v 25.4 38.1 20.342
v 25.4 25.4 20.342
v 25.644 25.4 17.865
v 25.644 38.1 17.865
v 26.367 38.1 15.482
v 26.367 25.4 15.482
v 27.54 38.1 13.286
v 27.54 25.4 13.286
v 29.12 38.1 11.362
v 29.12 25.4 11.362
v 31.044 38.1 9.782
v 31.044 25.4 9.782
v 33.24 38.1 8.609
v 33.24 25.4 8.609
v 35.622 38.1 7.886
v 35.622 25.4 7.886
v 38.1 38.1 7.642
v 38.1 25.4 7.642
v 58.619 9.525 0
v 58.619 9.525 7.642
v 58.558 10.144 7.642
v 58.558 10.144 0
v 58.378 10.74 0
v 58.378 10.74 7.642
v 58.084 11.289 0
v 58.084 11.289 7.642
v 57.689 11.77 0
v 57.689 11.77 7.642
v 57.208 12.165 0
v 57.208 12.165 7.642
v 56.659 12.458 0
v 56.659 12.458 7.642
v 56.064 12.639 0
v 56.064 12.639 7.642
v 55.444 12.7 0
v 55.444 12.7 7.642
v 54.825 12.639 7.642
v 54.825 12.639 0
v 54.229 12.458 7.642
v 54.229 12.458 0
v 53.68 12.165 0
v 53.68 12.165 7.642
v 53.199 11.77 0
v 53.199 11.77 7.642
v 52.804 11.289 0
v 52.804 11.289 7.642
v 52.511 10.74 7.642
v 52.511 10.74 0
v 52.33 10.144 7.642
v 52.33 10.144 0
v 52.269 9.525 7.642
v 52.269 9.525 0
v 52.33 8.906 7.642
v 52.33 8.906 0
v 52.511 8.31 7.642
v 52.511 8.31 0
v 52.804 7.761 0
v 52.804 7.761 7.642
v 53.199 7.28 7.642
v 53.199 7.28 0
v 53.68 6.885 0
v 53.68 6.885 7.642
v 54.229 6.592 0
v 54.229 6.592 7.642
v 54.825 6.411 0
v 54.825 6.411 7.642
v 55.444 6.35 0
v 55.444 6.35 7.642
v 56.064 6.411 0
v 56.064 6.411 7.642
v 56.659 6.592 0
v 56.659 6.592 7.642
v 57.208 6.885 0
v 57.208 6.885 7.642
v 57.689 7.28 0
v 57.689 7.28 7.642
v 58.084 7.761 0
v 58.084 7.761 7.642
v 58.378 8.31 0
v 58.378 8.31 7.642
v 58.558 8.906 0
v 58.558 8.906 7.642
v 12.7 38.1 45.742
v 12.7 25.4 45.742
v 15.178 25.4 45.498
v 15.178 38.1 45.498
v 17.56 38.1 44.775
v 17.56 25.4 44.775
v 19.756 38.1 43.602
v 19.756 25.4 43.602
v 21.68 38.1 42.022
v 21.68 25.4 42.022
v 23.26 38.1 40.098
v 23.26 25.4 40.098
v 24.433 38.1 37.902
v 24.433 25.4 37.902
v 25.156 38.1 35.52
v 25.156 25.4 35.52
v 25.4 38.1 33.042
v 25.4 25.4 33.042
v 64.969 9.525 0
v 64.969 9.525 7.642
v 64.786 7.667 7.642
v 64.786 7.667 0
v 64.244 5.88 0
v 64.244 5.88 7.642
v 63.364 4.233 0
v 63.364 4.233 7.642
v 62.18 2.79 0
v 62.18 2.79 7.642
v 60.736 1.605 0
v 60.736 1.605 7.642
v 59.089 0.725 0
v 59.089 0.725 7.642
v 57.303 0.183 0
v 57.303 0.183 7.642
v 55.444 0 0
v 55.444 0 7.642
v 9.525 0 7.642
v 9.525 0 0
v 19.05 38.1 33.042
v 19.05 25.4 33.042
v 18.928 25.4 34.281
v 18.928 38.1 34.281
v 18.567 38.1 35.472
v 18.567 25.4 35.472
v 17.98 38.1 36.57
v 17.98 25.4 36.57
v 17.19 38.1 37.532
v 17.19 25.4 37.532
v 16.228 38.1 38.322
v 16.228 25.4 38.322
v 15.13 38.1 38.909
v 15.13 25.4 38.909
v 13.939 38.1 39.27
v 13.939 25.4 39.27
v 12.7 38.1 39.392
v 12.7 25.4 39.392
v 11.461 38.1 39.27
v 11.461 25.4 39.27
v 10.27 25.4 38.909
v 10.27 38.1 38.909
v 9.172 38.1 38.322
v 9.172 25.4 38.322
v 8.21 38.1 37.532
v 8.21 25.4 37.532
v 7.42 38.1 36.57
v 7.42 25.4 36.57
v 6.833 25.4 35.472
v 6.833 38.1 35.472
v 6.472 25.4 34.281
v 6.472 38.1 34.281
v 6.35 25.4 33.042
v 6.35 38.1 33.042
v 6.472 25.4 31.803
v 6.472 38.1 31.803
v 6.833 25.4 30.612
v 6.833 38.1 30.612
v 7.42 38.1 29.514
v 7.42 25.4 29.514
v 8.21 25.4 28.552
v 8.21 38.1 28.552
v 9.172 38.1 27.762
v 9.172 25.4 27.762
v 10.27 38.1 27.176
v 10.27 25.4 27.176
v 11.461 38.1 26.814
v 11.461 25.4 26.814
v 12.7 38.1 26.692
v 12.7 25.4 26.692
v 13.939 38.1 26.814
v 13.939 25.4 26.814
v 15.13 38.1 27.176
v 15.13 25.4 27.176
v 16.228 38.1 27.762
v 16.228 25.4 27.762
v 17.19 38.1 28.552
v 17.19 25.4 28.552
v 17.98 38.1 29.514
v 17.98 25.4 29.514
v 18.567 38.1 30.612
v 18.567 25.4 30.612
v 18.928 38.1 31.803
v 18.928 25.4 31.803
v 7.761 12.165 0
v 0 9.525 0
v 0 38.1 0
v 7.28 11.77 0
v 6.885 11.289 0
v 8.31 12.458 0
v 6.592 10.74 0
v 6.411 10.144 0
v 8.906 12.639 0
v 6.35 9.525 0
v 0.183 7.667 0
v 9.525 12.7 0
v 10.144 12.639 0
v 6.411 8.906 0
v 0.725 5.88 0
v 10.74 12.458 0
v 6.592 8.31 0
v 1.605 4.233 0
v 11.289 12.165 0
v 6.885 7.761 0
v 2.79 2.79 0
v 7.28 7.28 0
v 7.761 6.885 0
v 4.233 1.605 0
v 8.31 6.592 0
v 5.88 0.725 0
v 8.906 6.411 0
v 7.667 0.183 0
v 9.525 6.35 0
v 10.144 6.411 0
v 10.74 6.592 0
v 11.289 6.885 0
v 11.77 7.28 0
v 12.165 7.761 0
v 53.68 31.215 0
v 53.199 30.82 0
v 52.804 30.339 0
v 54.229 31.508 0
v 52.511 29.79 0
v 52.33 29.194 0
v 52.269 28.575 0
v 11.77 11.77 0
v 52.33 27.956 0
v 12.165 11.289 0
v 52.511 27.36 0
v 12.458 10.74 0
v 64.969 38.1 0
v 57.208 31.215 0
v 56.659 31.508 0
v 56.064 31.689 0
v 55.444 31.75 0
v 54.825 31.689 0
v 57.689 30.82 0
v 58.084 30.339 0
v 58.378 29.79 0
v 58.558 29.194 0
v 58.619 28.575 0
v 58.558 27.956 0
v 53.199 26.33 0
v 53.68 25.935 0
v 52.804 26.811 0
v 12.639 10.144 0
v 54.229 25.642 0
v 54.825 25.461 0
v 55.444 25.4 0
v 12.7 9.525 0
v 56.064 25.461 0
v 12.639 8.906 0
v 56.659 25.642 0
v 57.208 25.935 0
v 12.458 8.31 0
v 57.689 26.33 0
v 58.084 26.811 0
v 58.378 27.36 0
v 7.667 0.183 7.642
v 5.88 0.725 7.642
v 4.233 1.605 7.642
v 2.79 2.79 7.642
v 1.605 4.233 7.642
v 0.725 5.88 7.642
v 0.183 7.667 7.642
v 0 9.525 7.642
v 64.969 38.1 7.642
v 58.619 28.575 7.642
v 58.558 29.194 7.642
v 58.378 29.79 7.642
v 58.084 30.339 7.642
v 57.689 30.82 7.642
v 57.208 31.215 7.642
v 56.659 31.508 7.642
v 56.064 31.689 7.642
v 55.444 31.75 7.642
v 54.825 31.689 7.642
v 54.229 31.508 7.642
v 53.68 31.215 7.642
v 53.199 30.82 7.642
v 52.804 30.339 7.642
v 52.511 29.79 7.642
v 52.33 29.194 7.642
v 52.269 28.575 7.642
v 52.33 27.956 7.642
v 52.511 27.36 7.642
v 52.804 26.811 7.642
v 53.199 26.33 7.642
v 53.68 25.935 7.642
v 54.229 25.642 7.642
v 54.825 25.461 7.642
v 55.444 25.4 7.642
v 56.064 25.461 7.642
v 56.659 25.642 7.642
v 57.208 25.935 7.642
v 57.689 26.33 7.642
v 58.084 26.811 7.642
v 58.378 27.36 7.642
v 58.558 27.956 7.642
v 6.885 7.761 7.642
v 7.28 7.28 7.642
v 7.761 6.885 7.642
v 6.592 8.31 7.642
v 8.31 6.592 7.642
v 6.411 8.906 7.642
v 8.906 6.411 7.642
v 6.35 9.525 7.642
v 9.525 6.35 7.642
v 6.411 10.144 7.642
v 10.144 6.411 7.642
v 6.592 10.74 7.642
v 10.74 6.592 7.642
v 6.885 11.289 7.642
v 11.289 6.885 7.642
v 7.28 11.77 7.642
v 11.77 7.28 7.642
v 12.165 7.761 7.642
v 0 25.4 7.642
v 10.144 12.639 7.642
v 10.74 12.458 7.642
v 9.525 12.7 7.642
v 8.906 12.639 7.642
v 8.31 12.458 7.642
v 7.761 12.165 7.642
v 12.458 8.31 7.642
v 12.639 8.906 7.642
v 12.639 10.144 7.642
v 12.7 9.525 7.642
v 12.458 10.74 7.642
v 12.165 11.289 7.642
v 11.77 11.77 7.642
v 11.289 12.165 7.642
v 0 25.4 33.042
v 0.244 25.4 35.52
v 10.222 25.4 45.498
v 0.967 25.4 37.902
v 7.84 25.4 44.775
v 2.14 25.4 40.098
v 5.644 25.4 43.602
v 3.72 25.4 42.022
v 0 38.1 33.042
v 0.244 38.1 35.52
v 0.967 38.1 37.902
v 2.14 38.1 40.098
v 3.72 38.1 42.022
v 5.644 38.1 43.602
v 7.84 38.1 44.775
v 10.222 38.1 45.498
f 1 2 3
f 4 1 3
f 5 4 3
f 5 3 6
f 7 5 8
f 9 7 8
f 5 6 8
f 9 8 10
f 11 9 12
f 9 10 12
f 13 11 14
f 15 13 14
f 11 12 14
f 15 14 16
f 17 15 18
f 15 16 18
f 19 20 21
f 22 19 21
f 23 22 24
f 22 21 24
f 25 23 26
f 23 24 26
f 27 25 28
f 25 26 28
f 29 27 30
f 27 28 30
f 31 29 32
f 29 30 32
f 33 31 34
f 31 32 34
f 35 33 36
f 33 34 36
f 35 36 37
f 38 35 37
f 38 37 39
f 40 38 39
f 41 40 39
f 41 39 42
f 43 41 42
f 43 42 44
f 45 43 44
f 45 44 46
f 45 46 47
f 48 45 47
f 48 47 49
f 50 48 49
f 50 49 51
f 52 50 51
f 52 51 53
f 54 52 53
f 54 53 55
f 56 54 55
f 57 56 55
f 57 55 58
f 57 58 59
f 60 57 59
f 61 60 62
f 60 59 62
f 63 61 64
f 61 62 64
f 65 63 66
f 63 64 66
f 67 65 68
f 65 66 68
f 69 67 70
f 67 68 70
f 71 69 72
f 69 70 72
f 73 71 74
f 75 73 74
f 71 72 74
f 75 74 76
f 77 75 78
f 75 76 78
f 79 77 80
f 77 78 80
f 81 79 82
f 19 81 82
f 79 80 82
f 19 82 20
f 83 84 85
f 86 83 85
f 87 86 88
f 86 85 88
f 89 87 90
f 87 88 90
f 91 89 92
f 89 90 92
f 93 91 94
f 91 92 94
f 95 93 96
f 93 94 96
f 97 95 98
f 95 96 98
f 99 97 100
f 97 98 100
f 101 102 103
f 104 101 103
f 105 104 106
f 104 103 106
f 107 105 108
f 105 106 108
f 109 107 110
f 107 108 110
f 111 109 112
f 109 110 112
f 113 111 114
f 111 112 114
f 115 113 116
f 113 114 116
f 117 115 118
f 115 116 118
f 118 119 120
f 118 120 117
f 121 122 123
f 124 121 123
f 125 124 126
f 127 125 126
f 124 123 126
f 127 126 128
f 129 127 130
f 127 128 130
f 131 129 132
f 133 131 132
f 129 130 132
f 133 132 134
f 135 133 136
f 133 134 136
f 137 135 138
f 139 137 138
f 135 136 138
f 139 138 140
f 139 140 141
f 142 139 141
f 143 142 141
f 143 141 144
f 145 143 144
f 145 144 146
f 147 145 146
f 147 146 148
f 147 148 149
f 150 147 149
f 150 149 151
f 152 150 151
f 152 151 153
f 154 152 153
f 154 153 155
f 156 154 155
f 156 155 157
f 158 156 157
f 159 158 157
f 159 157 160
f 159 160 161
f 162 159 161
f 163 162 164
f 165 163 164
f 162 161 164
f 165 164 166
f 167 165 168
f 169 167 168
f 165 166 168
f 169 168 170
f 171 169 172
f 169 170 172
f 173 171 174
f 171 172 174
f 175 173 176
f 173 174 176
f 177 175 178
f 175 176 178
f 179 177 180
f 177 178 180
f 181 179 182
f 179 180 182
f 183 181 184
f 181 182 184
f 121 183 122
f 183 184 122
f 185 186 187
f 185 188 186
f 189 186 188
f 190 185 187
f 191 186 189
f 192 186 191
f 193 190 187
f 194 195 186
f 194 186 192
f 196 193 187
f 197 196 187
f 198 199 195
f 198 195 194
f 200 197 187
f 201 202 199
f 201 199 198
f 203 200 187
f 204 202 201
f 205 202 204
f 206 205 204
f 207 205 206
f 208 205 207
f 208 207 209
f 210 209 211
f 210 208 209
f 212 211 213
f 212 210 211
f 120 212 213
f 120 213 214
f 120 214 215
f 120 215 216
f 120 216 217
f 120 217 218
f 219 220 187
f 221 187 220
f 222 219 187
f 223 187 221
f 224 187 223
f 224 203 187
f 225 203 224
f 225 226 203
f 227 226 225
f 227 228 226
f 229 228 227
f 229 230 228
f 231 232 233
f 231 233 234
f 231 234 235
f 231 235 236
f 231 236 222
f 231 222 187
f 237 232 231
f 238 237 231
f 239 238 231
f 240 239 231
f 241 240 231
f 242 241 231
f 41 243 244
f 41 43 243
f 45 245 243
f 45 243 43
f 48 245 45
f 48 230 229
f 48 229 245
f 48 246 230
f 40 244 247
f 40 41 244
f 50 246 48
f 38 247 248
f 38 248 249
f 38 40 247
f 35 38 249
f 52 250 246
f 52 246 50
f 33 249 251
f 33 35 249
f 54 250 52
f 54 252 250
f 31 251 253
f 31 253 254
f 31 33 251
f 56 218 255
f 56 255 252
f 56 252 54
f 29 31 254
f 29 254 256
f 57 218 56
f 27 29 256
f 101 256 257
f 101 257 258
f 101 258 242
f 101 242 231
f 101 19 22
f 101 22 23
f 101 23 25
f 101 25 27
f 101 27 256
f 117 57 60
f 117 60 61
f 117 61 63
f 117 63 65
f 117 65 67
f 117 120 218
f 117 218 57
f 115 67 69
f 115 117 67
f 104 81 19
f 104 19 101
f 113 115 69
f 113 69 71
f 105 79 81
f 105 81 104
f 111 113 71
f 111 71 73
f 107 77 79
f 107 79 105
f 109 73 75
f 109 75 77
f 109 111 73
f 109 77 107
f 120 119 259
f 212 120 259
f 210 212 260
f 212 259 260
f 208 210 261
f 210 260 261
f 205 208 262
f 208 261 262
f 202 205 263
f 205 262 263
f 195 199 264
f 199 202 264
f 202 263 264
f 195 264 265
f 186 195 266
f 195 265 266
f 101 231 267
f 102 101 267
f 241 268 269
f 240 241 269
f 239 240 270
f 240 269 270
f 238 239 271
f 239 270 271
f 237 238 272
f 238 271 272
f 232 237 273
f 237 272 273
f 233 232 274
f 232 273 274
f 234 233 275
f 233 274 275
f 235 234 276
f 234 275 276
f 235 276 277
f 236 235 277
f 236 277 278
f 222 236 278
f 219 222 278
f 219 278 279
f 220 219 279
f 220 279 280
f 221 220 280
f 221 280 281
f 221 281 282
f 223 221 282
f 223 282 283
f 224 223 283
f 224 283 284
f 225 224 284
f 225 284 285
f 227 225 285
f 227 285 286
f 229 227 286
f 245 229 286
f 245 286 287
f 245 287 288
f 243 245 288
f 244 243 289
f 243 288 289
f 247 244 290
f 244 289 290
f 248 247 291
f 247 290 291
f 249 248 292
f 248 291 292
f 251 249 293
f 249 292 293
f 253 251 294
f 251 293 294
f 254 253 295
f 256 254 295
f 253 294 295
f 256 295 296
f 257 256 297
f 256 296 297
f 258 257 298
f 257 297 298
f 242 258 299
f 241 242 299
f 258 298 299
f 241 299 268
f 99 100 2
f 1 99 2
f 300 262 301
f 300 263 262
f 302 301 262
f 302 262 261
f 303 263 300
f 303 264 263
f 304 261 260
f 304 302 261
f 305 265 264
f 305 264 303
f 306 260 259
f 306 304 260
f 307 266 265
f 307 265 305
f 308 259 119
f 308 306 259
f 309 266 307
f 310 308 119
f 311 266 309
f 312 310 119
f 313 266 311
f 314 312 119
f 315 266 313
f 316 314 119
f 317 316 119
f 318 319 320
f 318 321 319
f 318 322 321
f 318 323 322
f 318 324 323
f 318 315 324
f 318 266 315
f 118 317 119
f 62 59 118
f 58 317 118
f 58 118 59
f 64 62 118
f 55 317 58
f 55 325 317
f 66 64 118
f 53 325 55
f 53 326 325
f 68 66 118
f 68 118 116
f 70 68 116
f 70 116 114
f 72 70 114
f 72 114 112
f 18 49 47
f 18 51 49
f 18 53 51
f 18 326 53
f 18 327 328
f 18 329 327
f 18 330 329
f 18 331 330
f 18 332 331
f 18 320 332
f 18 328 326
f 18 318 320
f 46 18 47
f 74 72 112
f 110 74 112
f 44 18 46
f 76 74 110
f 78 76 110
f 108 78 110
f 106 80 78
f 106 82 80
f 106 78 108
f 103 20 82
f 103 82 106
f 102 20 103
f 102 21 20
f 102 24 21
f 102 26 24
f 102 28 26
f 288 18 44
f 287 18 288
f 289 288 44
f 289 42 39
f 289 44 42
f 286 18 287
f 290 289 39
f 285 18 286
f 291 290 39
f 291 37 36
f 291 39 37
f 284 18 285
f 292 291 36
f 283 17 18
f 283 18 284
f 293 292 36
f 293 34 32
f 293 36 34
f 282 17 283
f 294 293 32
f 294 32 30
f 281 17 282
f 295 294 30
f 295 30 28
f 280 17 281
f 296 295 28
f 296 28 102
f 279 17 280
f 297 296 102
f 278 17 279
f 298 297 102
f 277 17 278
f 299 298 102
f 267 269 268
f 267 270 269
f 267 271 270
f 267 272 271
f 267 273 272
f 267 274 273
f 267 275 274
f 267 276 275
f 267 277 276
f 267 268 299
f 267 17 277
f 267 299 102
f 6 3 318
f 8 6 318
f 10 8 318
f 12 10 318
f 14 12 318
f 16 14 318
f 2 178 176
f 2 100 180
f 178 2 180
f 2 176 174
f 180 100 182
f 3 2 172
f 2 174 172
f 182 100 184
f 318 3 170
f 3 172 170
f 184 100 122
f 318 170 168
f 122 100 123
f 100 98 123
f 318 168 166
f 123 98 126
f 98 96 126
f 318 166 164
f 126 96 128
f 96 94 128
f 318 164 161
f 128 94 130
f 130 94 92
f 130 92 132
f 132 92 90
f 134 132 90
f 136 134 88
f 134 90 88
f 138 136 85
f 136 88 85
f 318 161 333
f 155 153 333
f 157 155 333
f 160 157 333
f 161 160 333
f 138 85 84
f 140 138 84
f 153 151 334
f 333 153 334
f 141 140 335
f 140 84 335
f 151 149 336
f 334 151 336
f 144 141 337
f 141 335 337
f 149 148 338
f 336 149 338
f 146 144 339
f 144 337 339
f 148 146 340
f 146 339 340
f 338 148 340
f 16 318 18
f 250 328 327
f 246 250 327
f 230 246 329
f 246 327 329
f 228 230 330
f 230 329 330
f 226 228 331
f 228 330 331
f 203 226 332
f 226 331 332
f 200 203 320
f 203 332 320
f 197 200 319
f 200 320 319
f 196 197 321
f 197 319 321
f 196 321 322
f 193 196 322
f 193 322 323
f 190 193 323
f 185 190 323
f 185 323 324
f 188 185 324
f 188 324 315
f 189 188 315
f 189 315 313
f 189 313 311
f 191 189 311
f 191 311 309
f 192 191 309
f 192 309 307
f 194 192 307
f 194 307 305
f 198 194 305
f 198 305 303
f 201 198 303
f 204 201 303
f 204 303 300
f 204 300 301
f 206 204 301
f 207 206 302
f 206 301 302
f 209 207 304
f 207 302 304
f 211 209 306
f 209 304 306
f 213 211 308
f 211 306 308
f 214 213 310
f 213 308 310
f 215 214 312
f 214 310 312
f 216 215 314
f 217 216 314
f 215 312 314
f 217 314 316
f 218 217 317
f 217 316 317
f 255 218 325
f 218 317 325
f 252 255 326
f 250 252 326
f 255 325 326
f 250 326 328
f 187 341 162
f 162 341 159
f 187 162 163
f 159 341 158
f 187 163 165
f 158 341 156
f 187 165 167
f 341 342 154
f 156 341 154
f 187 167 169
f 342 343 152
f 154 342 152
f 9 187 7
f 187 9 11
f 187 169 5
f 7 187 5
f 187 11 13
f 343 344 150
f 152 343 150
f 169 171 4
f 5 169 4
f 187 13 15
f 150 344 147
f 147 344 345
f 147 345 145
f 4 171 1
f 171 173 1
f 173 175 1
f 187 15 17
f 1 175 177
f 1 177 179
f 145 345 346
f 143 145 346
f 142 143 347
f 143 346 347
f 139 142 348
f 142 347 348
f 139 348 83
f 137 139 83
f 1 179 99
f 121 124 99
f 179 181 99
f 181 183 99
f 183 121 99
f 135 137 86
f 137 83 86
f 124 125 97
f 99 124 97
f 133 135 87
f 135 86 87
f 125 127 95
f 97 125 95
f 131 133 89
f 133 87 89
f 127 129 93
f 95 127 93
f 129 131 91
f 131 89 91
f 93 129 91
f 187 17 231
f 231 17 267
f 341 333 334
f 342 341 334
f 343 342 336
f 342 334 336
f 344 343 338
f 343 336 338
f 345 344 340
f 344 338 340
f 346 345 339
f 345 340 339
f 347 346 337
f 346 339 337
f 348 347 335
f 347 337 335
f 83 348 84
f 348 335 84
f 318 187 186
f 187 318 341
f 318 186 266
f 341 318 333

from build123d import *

# Parameters (mm, degrees)
F0_W     = 64.9693608284
F0_H     = 45.7421503961
F1_DEPTH = 38.1
F3_DEPTH = 38.1
F4_R     = 6.35
F5_DEPTH = 25.4
F6_R     = 3.175
F7_DEPTH = 25.4


with BuildPart() as f1:
    # F0 (on Front) → F1 (new body)
    with BuildSketch(Plane.XZ):
        with Locations((32.4846804142, 22.8710751981)):
            Rectangle(F0_W, F0_H)
    extrude(amount=-F1_DEPTH)

    # F2 (on face) → F3 (cut)
    with BuildSketch(Plane.XY.offset(45.7421503961)):
        Polygon((38.1, 25.4), (0, 25.4), (0, 0), (64.9693608284, 0), (64.9693608284, 38.1), (38.1, 38.1), align=None)
    extrude(amount=-F3_DEPTH, mode=Mode.SUBTRACT)

    # F4 (on face) → F5 (cut)
    with BuildSketch(Plane.XZ.offset(-25.4)):
        with Locations((12.7, 33.0421503961)):
            Circle(F4_R)
        with BuildLine():
            ThreePointArc((12.6999999513, 45.7421503961), (21.6802561039, 42.0224065344), (25.4, 33.0421503961))
            Line((25.4, 33.0421503961), (25.4, 20.3421503961))
            ThreePointArc((25.4, 20.3421503961), (29.1197438789, 11.361894275), (38.1, 7.6421503961))
            Line((38.1, 7.6421503961), (38.1, 45.7421503961))
            Line((38.1, 45.7421503961), (12.6999999513, 45.7421503961))
        make_face()
        with BuildLine():
            ThreePointArc((0, 33.0421503961), (3.7197438617, 42.0224065), (12.6999999513, 45.7421503961))
            Line((12.6999999513, 45.7421503961), (0, 45.7421503961))
            Line((0, 45.7421503961), (0, 33.0421503961))
        make_face()
    extrude(amount=-F5_DEPTH, mode=Mode.SUBTRACT)

    # F6 (on face) → F7 (cut)
    with BuildSketch(Plane.XY.offset(7.6421503961)):
        with Locations((9.525, 9.525)):
            Circle(F6_R)
        with Locations((55.4443608284, 9.525)):
            Circle(F6_R)
        with Locations((55.4443608284, 28.575)):
            Circle(F6_R)
        with BuildLine():
            ThreePointArc((64.9693608284, 9.525), (62.1795529192, 2.7898079092), (55.4443608284, 0))
            Line((55.4443608284, 0), (64.9693608284, 0))
            Line((64.9693608284, 0), (64.9693608284, 9.525))
        make_face()
        with BuildLine():
            ThreePointArc((9.525, 0), (2.7898079092, 2.7898079092), (0, 9.525))
            Line((0, 9.525), (0, 0))
            Line((0, 0), (9.525, 0))
        make_face()
    extrude(amount=-F7_DEPTH, mode=Mode.SUBTRACT)


solid = f1.part
